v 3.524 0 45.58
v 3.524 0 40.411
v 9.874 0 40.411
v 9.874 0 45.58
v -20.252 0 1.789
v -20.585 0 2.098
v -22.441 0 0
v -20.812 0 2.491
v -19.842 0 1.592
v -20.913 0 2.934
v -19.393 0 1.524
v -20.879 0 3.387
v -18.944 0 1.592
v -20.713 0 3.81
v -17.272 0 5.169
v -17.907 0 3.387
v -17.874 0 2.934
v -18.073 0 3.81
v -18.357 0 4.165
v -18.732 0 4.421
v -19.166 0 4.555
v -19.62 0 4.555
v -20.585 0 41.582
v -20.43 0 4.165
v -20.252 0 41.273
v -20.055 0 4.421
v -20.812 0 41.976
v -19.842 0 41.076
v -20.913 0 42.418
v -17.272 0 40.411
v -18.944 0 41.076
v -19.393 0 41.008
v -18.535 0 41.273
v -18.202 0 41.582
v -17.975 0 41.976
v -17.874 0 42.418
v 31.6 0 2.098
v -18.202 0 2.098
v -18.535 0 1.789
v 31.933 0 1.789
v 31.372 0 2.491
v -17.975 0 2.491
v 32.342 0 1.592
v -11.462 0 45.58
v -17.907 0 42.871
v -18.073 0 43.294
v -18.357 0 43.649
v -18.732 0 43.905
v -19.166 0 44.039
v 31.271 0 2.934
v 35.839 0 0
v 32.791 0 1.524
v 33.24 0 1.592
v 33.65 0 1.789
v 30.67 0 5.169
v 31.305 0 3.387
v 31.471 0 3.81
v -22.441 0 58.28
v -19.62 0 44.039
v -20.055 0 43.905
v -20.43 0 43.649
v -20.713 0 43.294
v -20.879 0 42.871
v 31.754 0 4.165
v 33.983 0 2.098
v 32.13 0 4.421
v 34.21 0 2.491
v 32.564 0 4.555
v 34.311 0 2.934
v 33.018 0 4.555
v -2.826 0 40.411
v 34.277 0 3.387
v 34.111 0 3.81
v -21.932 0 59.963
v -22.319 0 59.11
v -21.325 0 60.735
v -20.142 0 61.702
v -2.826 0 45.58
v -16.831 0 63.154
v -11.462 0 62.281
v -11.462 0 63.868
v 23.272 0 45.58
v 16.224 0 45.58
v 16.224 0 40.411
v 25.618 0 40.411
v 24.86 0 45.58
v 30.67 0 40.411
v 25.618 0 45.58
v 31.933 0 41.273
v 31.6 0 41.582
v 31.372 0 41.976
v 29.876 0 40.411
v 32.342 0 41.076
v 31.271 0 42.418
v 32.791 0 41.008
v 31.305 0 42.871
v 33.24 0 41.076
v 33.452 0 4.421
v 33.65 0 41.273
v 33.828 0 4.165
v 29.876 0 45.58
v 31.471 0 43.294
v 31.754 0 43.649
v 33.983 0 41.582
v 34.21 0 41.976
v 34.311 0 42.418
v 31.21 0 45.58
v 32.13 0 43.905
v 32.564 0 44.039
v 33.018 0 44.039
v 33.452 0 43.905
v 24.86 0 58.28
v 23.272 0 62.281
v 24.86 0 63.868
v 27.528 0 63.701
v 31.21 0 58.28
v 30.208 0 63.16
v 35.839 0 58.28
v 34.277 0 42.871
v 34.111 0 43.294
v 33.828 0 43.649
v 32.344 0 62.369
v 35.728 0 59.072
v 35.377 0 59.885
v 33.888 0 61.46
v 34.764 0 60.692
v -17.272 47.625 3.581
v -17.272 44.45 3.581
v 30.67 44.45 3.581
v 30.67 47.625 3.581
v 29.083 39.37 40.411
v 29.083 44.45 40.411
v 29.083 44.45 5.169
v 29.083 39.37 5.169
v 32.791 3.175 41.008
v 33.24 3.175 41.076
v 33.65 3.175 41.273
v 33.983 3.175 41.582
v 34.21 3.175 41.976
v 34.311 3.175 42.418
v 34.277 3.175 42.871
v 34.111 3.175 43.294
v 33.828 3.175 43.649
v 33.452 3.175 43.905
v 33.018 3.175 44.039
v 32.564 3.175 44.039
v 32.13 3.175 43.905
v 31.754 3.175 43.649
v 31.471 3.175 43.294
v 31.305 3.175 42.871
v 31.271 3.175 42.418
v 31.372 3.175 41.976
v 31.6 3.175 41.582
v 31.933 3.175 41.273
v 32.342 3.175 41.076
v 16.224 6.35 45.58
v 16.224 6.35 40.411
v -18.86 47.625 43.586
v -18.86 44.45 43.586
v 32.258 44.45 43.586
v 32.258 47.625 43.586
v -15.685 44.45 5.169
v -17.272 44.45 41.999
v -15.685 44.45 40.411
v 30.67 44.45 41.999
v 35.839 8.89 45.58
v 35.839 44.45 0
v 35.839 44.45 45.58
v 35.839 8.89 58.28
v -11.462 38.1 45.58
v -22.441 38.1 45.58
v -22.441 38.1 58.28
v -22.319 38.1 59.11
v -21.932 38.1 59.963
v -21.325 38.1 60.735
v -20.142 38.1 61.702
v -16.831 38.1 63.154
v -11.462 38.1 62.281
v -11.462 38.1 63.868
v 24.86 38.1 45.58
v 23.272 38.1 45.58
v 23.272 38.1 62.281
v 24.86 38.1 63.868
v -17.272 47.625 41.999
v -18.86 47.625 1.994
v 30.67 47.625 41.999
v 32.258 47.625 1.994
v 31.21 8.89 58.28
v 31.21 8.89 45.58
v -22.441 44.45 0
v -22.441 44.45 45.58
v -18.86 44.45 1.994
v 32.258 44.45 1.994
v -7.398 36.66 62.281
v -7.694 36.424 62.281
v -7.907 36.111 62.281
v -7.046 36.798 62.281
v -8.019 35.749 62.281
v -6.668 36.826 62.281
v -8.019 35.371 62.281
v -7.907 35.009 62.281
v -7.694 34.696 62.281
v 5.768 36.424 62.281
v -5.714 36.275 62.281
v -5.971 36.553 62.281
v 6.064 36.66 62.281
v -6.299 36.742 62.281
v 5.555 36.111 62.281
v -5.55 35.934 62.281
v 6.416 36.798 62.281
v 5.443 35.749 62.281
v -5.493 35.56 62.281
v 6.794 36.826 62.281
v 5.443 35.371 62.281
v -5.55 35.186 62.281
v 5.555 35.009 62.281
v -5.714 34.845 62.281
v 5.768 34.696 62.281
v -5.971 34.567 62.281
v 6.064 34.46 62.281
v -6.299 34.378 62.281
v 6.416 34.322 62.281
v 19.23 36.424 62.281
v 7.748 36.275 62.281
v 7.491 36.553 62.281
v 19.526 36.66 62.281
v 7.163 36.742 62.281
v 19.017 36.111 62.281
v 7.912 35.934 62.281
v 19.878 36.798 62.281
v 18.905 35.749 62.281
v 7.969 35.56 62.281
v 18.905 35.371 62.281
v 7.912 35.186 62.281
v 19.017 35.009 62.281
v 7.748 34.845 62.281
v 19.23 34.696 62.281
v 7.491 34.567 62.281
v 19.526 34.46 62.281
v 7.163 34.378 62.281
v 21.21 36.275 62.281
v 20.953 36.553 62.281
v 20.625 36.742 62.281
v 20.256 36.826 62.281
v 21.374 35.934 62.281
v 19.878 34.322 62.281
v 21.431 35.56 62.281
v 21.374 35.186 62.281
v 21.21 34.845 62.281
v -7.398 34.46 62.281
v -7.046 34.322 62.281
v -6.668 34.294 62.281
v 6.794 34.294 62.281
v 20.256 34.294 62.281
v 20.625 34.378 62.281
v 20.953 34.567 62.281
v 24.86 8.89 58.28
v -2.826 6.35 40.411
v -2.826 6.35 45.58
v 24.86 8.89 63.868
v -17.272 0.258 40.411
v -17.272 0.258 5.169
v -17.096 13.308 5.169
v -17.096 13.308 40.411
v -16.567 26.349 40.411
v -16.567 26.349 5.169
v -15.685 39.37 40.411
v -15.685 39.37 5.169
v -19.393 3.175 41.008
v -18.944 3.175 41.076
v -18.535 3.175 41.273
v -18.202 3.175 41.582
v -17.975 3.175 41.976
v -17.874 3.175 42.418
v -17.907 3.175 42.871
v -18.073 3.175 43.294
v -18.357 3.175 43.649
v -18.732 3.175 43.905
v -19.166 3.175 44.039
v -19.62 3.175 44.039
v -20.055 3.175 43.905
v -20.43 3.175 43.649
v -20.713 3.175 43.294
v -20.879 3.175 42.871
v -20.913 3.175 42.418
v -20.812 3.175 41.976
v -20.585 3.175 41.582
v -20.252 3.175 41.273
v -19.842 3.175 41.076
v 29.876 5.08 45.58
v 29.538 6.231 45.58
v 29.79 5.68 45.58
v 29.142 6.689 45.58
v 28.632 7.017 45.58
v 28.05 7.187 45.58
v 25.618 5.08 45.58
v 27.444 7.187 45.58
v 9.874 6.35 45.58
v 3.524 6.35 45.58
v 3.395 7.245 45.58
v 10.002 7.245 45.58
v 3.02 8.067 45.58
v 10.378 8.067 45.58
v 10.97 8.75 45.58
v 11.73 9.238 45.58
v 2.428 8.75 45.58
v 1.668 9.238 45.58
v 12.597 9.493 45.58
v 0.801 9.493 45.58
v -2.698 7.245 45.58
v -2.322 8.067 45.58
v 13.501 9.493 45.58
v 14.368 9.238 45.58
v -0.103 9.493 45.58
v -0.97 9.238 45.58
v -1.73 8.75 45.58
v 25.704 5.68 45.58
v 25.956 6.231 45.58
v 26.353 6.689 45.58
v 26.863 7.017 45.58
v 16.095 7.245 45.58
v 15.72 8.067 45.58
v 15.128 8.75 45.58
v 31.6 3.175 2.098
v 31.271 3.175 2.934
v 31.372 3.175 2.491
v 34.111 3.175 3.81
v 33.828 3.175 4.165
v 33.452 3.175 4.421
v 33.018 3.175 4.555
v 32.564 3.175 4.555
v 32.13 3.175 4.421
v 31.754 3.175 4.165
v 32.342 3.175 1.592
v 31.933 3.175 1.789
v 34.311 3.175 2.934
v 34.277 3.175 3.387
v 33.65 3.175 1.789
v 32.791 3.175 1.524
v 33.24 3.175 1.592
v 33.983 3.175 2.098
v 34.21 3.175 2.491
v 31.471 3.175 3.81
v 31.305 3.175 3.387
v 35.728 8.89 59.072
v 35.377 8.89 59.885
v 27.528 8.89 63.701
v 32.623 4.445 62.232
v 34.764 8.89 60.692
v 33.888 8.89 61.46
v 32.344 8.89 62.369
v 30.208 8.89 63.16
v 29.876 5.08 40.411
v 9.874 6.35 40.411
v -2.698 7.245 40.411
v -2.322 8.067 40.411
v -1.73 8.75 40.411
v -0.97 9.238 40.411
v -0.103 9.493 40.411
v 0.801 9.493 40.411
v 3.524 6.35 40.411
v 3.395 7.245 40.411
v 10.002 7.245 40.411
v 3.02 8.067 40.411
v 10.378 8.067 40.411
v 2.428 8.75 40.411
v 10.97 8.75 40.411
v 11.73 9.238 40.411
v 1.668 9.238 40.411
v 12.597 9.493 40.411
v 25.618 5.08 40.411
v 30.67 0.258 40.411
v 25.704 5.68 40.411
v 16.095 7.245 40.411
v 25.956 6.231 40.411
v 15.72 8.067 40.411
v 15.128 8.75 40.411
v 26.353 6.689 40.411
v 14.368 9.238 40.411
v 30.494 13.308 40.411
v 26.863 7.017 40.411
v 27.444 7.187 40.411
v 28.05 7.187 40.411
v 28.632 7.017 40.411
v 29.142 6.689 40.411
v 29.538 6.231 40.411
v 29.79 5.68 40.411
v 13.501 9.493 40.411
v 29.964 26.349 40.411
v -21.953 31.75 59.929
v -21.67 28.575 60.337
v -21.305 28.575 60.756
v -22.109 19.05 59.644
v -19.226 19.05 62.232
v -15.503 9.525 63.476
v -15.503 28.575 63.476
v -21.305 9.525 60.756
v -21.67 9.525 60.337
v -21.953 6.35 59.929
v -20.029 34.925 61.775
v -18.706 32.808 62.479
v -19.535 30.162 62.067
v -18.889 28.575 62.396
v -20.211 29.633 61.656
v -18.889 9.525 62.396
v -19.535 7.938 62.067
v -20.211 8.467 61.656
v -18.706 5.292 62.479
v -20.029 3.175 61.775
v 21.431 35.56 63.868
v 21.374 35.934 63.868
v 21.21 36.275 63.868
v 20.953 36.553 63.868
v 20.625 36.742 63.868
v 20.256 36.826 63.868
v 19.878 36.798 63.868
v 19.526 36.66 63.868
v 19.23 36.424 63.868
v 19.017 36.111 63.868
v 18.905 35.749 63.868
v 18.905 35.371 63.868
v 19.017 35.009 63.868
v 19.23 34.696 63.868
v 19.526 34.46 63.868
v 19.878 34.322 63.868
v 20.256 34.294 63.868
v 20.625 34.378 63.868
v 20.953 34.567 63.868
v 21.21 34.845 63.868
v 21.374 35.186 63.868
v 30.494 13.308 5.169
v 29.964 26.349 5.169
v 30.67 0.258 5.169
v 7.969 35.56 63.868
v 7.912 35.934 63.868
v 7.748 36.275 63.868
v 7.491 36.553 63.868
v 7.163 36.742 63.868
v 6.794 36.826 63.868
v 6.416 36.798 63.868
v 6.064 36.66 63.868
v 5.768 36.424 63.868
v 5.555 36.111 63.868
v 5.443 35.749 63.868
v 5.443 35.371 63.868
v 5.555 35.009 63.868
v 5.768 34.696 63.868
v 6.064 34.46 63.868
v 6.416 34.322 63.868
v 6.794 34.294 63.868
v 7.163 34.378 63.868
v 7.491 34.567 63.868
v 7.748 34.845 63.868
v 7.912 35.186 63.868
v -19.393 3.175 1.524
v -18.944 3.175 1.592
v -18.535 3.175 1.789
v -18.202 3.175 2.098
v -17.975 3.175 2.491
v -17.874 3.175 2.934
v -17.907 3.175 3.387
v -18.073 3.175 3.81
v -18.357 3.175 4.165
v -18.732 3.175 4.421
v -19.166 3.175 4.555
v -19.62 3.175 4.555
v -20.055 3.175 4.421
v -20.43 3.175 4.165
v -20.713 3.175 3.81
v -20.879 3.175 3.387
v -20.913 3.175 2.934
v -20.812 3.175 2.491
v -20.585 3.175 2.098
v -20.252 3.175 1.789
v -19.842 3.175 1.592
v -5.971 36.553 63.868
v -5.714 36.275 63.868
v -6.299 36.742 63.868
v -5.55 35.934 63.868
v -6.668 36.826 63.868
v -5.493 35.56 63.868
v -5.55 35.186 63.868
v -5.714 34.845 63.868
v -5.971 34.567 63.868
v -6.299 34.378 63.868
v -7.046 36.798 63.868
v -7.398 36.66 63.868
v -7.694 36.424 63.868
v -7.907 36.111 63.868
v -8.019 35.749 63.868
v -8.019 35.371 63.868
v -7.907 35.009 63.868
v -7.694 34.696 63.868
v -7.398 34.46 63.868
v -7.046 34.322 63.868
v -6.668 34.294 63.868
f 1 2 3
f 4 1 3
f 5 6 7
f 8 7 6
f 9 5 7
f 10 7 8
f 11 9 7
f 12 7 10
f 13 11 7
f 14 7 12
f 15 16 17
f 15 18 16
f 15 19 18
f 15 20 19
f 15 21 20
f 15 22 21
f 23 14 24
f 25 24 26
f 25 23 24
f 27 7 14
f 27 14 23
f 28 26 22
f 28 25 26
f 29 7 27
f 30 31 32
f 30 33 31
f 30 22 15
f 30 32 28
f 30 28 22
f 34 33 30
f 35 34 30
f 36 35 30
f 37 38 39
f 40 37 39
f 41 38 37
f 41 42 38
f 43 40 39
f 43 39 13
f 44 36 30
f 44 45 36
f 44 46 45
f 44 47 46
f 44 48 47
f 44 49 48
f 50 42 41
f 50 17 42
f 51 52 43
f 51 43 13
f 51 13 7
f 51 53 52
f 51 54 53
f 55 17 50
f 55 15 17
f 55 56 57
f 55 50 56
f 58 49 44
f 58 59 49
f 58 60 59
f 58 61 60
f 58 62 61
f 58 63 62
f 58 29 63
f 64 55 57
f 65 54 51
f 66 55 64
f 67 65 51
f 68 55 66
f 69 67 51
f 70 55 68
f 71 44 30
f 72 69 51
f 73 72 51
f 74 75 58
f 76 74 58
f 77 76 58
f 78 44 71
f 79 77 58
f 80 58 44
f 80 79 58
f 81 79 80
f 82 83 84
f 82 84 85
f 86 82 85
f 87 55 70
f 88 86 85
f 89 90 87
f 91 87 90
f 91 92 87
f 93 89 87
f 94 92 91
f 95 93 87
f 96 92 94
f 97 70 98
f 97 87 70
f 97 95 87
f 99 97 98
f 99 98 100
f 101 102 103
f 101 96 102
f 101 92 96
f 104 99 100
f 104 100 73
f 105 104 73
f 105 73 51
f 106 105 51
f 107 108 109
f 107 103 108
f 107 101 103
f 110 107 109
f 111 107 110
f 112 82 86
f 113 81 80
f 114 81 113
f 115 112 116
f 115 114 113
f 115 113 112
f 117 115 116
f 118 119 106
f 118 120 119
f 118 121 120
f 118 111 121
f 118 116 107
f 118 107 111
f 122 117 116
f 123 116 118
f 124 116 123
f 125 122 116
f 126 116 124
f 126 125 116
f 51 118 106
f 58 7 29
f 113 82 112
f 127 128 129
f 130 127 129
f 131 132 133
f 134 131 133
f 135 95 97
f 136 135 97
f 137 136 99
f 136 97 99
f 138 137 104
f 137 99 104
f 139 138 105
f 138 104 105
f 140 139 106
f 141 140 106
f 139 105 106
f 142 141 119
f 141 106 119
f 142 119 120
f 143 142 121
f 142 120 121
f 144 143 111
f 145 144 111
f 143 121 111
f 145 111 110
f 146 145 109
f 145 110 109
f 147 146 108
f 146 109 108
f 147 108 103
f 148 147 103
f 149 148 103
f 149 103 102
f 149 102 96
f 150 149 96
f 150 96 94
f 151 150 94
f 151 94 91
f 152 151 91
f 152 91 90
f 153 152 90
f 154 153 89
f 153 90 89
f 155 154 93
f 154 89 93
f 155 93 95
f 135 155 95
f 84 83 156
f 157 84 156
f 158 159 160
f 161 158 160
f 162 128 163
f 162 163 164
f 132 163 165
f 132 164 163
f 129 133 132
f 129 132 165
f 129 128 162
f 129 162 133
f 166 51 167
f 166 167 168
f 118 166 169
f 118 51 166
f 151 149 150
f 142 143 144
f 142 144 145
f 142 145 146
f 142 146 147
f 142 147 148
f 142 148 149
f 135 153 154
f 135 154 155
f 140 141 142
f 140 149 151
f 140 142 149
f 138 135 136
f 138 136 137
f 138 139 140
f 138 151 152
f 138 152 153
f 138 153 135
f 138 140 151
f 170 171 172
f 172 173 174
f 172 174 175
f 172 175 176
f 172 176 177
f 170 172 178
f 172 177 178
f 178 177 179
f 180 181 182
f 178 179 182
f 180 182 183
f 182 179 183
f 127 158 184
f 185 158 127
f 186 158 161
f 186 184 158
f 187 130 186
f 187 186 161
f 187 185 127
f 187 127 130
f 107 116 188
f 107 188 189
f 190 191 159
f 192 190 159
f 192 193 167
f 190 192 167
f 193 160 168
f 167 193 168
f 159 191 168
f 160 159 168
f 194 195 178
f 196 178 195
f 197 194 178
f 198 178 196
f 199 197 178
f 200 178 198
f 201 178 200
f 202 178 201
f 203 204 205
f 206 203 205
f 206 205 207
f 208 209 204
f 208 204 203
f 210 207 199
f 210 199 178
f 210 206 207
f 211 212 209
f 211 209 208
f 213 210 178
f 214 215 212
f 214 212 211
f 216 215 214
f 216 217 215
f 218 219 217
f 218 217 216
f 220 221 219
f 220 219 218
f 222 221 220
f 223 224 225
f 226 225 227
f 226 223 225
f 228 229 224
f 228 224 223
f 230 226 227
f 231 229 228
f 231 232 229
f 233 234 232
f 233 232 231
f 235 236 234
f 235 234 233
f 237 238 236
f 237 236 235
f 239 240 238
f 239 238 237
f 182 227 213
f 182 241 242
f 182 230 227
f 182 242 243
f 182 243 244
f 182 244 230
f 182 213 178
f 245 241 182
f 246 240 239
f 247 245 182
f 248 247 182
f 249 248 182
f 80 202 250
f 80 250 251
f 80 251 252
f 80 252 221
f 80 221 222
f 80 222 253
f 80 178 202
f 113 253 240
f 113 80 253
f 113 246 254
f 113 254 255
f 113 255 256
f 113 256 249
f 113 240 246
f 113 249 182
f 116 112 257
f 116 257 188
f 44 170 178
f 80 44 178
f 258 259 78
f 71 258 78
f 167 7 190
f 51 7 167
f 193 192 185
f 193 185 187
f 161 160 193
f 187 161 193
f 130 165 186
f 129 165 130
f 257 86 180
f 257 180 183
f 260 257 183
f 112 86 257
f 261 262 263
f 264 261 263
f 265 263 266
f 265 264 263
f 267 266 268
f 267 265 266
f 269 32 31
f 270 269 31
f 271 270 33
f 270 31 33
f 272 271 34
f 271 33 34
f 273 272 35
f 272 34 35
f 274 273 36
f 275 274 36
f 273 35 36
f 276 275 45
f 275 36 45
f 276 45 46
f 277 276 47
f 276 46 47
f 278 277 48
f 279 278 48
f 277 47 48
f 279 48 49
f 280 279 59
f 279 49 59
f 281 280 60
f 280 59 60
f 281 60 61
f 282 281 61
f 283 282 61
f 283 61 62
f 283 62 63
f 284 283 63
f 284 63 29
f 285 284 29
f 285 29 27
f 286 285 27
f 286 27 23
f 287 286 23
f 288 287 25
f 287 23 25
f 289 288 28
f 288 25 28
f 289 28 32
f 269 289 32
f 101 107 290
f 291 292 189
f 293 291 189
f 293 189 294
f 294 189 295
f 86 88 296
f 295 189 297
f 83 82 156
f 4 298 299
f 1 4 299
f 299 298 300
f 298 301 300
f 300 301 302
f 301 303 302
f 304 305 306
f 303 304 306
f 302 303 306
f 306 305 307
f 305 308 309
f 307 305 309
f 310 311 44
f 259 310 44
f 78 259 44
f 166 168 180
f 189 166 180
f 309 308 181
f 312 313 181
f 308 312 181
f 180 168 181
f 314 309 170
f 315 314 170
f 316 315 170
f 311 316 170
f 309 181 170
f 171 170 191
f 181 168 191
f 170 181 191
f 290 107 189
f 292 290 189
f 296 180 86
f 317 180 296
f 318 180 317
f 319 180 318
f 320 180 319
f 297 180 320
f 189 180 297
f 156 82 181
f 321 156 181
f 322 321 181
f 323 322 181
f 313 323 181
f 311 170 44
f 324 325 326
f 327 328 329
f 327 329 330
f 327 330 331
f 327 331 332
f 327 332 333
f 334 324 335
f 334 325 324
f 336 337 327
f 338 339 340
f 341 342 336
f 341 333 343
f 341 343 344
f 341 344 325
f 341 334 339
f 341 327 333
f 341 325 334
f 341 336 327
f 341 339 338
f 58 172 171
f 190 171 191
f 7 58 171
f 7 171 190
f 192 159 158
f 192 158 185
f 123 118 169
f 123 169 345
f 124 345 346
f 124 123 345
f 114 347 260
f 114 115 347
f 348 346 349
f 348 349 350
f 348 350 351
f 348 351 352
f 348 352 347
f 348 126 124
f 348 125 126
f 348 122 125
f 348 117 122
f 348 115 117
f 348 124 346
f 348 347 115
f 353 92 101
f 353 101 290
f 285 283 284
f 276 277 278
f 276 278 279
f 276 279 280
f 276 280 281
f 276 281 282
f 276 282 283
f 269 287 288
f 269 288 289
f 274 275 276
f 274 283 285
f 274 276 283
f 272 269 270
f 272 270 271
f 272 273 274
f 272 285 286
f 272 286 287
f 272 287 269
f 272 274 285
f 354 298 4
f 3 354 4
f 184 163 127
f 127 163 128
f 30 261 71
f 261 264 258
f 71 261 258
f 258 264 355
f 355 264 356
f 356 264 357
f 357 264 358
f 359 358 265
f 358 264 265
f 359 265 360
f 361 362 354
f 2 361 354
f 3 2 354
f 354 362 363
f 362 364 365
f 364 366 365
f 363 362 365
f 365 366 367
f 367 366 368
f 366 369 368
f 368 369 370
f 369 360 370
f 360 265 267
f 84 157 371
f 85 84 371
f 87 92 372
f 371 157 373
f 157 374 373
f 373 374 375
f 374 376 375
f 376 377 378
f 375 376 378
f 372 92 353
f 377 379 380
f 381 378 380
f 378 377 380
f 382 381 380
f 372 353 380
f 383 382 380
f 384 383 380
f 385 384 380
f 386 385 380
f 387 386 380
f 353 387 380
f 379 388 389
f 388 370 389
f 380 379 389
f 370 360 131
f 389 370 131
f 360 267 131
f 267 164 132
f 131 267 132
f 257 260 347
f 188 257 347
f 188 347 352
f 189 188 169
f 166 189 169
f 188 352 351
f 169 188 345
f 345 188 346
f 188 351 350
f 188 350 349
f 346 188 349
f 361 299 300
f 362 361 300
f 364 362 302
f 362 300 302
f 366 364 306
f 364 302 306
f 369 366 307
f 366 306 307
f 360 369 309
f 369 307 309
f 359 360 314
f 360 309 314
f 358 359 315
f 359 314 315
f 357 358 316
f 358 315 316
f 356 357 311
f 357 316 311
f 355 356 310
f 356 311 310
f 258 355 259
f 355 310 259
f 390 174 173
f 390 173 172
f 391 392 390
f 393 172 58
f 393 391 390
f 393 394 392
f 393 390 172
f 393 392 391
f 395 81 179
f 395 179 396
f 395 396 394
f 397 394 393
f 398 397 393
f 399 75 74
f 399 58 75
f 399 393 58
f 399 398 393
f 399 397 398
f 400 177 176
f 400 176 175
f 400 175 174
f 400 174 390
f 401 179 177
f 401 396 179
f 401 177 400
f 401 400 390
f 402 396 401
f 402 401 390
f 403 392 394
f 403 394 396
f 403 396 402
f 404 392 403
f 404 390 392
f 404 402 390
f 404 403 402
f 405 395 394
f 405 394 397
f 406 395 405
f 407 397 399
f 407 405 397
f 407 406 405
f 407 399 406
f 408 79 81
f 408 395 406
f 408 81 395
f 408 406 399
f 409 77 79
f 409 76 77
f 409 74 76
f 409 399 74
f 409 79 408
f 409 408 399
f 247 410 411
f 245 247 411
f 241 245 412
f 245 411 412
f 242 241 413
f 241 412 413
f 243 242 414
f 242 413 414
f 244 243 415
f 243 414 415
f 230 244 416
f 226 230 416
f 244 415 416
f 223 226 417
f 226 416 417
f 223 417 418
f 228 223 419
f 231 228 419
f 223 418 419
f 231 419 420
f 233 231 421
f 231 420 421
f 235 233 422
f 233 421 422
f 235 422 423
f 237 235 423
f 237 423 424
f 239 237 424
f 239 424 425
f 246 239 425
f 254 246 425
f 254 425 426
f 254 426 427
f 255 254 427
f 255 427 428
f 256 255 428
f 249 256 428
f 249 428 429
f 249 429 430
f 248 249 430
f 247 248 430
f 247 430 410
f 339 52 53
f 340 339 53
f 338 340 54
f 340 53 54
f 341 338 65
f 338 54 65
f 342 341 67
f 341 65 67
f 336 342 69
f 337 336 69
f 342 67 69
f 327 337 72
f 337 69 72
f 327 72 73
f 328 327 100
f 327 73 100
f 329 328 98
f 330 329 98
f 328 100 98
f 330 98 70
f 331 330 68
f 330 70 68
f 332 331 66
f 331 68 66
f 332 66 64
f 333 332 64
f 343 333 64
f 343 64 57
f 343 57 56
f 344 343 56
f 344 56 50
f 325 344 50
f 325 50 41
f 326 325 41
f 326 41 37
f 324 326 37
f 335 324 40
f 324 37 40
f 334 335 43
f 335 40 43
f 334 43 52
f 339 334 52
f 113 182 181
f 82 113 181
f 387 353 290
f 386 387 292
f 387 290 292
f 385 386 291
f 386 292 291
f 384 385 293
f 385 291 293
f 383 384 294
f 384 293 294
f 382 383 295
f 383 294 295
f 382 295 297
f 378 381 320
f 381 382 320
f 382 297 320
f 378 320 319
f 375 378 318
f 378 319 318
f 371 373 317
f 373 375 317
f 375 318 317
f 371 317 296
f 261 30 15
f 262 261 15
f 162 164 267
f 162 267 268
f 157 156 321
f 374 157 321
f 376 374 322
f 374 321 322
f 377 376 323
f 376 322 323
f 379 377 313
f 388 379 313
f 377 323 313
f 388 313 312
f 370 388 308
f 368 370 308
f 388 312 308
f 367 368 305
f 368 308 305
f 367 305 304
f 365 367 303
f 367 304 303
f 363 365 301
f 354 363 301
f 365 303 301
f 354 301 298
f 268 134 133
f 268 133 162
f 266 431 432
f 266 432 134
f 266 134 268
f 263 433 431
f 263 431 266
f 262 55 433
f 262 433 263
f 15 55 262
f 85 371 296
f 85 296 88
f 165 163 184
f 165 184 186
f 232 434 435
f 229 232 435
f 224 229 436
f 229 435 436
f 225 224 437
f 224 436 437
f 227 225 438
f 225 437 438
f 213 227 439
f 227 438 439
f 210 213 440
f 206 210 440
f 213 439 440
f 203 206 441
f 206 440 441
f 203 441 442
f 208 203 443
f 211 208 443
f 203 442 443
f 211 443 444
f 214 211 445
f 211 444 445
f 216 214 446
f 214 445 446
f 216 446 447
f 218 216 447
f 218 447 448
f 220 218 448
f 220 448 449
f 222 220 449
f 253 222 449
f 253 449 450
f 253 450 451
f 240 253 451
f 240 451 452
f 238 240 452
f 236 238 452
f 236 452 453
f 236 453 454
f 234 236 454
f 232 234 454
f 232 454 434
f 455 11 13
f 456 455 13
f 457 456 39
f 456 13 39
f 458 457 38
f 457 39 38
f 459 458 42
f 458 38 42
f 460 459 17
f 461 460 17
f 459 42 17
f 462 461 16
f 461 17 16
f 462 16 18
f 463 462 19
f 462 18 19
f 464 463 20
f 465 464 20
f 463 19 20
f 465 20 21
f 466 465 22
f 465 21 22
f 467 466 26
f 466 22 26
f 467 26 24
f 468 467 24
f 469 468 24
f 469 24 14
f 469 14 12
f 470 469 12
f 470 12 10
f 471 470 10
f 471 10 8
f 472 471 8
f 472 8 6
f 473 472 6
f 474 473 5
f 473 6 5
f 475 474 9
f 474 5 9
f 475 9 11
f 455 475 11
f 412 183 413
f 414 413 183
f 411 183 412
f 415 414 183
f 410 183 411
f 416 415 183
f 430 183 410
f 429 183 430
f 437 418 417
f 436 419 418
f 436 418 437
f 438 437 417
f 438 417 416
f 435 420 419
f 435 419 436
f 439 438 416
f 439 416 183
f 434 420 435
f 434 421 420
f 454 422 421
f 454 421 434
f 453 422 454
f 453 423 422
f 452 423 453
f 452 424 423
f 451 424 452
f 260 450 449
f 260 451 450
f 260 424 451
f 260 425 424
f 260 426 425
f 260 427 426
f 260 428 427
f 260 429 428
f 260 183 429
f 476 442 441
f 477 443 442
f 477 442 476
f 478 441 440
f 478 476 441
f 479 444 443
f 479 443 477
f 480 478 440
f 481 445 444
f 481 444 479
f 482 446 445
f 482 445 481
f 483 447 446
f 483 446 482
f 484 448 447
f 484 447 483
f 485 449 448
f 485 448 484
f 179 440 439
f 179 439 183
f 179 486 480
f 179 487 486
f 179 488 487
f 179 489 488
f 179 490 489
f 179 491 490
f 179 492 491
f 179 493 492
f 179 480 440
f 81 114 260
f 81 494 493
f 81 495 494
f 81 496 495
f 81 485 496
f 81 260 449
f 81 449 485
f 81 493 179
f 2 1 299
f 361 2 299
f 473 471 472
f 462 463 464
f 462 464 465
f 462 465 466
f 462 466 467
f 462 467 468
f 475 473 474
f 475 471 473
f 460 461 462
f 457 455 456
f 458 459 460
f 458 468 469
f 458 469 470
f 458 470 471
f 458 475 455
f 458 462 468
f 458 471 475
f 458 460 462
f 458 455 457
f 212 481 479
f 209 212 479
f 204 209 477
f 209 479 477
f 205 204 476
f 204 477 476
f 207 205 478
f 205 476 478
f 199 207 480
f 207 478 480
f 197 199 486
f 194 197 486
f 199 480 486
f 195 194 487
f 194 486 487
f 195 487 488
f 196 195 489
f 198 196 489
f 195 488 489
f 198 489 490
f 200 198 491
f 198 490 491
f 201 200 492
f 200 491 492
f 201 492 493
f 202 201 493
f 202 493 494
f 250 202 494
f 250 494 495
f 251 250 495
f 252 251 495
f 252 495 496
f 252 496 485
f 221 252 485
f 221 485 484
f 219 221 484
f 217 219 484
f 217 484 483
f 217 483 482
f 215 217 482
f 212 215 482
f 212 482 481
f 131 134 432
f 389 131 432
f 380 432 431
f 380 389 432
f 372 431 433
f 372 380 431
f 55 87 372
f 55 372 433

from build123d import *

# Parameters (mm, degrees)
SKETCH3_W            = 55.1053
SKETCH3_H            = 45.5803
BOSS_EXTRUDE2_DEPTH  = 44.45
SKETCH11_W           = 51.1175
SKETCH11_H           = 41.5925
SKETCH11_W_2         = 47.9425
SKETCH11_H_2         = 38.4175
BOSS_EXTRUDE3_DEPTH  = 3.175
SKETCH13_W           = 44.7675
SKETCH13_H           = 35.2425
CUT_EXTRUDE3_DEPTH   = 73.294764944
CUT_EXTRUDE4_DEPTH   = 5.1689
SKETCH19_W           = 1.5875
SKETCH19_H           = 45.5803
BOSS_EXTRUDE4_DEPTH  = 44.45
SKETCH21_W           = 1.5875
SKETCH21_H           = 35.2425
CUT_EXTRUDE5_DEPTH   = 39.37
FILLET1_R            = 482.6
FILLET2_R            = 482.6
SKETCH22_R           = 1.524
CUT_EXTRUDE7_DEPTH   = 3.175
BOSS_EXTRUDE5_DEPTH  = 38.1
SKETCH39_R           = 1.27
CUT_EXTRUDE14_DEPTH  = 3.81
BOSS_EXTRUDE22_DEPTH = 8.89
SKETCH48_W           = 18.288
SKETCH48_H           = 29.21
BOSS_EXTRUDE23_DEPTH = 1.5875


with BuildPart() as part:
    # Sketch3 → Boss-Extrude2 (new body)
    with BuildSketch(Plane(origin=(0, 0, 0), x_dir=(1, 0, 0), z_dir=(0, 1, 0))):
        with Locations((6.69887245, -22.79015)):
            Rectangle(SKETCH3_W, SKETCH3_H)
    extrude(amount=BOSS_EXTRUDE2_DEPTH)

    # Sketch11 → Boss-Extrude3 (add)
    with BuildSketch(Plane(origin=(0, 44.45, 0), x_dir=(1, 0, 0), z_dir=(0, 1, 0))):
        with Locations((6.69887245, -22.79015)):
            Rectangle(SKETCH11_W, SKETCH11_H)
        with Locations((6.69887245, -22.79015)):
            Rectangle(SKETCH11_W_2, SKETCH11_H_2, mode=Mode.SUBTRACT)
    extrude(amount=BOSS_EXTRUDE3_DEPTH)

    # Sketch13 → Cut-Extrude3 (cut, through all)
    with BuildSketch(Plane(origin=(0, 44.45, 0), x_dir=(1, 0, 0), z_dir=(0, 1, 0))):
        with Locations((6.69887245, -22.79015)):
            Rectangle(SKETCH13_W, SKETCH13_H)
    extrude(amount=-CUT_EXTRUDE3_DEPTH, mode=Mode.SUBTRACT)

    # Sketch14 → Cut-Extrude4 (cut)
    with BuildSketch(Plane.XY.offset(45.5803)):
        with BuildLine():
            Line((-2.82612755, 6.35), (-2.82612755, 0))
            Line((-2.82612755, 0), (3.52387245, 0))
            Line((3.52387245, 0), (3.52387245, 6.35))
            ThreePointArc((3.52387245, 6.35), (0.34887245, 9.525), (-2.82612755, 6.35))
        make_face()
        with BuildLine():
            Line((9.87387245, 6.35), (9.87387245, 0))
            Line((9.87387245, 0), (16.22387245, 0))
            Line((16.22387245, 0), (16.22387245, 6.35))
            ThreePointArc((16.22387245, 6.35), (13.04887245, 9.525), (9.87387245, 6.35))
        make_face()
        with BuildLine():
            Line((25.618069301, 0), (29.87637245, 0))
            Line((29.87637245, 0), (29.87637245, 5.08))
            ThreePointArc((29.87637245, 5.08), (27.747220876, 7.209151575), (25.618069301, 5.08))
            Line((25.618069301, 5.08), (25.618069301, 0))
        make_face()
    extrude(amount=-CUT_EXTRUDE4_DEPTH, mode=Mode.SUBTRACT)

    # Sketch19 → Boss-Extrude4 (add)
    with BuildSketch(Plane.XZ):
        with Locations((-21.64752755, 22.79015)):
            Rectangle(SKETCH19_W, SKETCH19_H)
        with Locations((35.04527245, 22.79015)):
            Rectangle(SKETCH19_W, SKETCH19_H)
    extrude(amount=-BOSS_EXTRUDE4_DEPTH)

    # Sketch21 → Cut-Extrude5 (cut)
    with BuildSketch(Plane(origin=(0, 0, 0), x_dir=(-1, 0, 0), z_dir=(0, -1, 0))):
        with Locations((16.47862755, -22.79015)):
            Rectangle(SKETCH21_W, SKETCH21_H)
        with Locations((-29.87637245, -22.79015)):
            Rectangle(SKETCH21_W, SKETCH21_H)
    extrude(amount=-CUT_EXTRUDE5_DEPTH, mode=Mode.SUBTRACT)

    # Fillet1
    # the kernel refuses this fillet: 482.6 mm, written as the material it adds along each edge
    with BuildSketch(Plane(origin=(-17.27237755, 39.37, 40.4114), x_dir=(1, 0, 0), z_dir=(0, 0, -1))) as fillet1_piece_1:
        with BuildLine():
            CenterArc((482.6, 39.111824858), FILLET1_R, 180, 4.648576264)
            Line((0, 39.111824858), (0, 0))
            Line((0, 0), (1.5875, 0))
        make_face()
    extrude(amount=35.2425)

    # Fillet2
    # the kernel refuses this fillet: 482.6 mm, written as the material it adds along each edge
    with BuildSketch(Plane(origin=(30.67012245, 39.37, 138.190962146), x_dir=(0, -1, 0), z_dir=(0, 0, -1))) as fillet2_piece_1_section:
        with BuildLine():
            CenterArc((39.111824858, 482.6), FILLET2_R, 265.351423736, 4.648576264)
            Line((0, 1.5875), (0, 0))
            Line((0, 0), (39.111824858, 0))
        make_face()
    fillet2_piece_1 = extrude(amount=230.801624292, mode=Mode.PRIVATE)
    fillet2_piece_1 = split(fillet2_piece_1, bisect_by=Plane(origin=(30.67012245, 39.37, 45.5803), z_dir=(0, 0, -1)), keep=Keep.TOP, mode=Mode.PRIVATE)
    fillet2_piece_1 = split(fillet2_piece_1, bisect_by=Plane(origin=(30.67012245, 39.37, 0), z_dir=(0, 0, 1)), keep=Keep.TOP, mode=Mode.PRIVATE)
    add(fillet2_piece_1)

    # Sketch22 → Cut-Extrude7 (cut)
    with BuildSketch(Plane.XZ):
        with Locations(Location((-19.39327755, 42.5323, 0), (0, 0, 270))):
            Circle(SKETCH22_R)
        with Locations(Location((32.79102245, 42.5323, 0), (0, 0, 270))):
            Circle(SKETCH22_R)
        with Locations(Location((-19.39327755, 3.048, 0), (0, 0, 270))):
            Circle(SKETCH22_R)
        with Locations(Location((32.79102245, 3.048, 0), (0, 0, 270))):
            Circle(SKETCH22_R)
    extrude(amount=-CUT_EXTRUDE7_DEPTH, mode=Mode.SUBTRACT)

    # Sketch23 → Boss-Extrude5 (add)
    with BuildSketch(Plane.XZ):
        with BuildLine():
            Line((24.85987245, 63.8683), (-11.46212755, 63.8683))
            add(Edge.make_bspline(
                [(-11.46212755, 63.8683), (-22.44127755, 63.8683), (-22.44127755, 58.2803)],
                knots=[4.71238898, 4.71238898, 4.71238898, 6.283185307, 6.283185307, 6.283185307], degree=2, weights=[1, 0.707106781, 1]))
            Line((-22.44127755, 58.2803), (-22.44127755, 45.5803))
            Line((-22.44127755, 45.5803), (-20.85377755, 45.5803))
            Line((-20.85377755, 45.5803), (-11.46212755, 45.5803))
            Line((-11.46212755, 45.5803), (-11.46212755, 62.2808))
            Line((-11.46212755, 62.2808), (24.85987245, 62.2808))
            Line((24.85987245, 62.2808), (24.85987245, 63.8683))
        make_face()
    extrude(amount=-BOSS_EXTRUDE5_DEPTH)

    # Sketch39 → Cut-Extrude14 (cut)
    with BuildSketch(Plane.XY.offset(63.8683)):
        with Locations((6.69887245, 35.56)):
            Circle(SKETCH39_R)
        with Locations((-6.76312755, 35.56)):
            Circle(SKETCH39_R)
        with Locations((20.16087245, 35.56)):
            Circle(SKETCH39_R)
    extrude(amount=-CUT_EXTRUDE14_DEPTH, mode=Mode.SUBTRACT)

    # Sketch43 → Boss-Extrude22 (add)
    with BuildSketch(Plane.XZ):
        with BuildLine():
            Line((31.20987245, 45.5803), (35.83902245, 45.5803))
            Line((35.83902245, 45.5803), (35.83902245, 58.2803))
            add(Edge.make_bspline(
                [(35.83902245, 58.2803), (35.83902245, 63.8683), (24.85987245, 63.8683)],
                knots=[3.141592654, 3.141592654, 3.141592654, 4.71238898, 4.71238898, 4.71238898], degree=2, weights=[1, 0.707106781, 1]))
            Line((24.85987245, 63.8683), (24.85987245, 62.2808))
            Line((24.85987245, 62.2808), (23.27237245, 62.2808))
            Line((23.27237245, 62.2808), (23.27237245, 45.5803))
            Line((23.27237245, 45.5803), (24.85987245, 45.5803))
            Line((24.85987245, 45.5803), (24.85987245, 58.2803))
            Line((24.85987245, 58.2803), (31.20987245, 58.2803))
            Line((31.20987245, 58.2803), (31.20987245, 45.5803))
        make_face()
    extrude(amount=-BOSS_EXTRUDE22_DEPTH)

    # Sketch48 → Boss-Extrude23 (add)
    with BuildSketch(Plane(origin=(24.85987245, 0, 0), x_dir=(0, 0, -1), z_dir=(1, 0, 0))):
        with Locations((-54.7243, 23.495)):
            Rectangle(SKETCH48_W, SKETCH48_H)
    extrude(amount=-BOSS_EXTRUDE23_DEPTH)


solid = part.part
